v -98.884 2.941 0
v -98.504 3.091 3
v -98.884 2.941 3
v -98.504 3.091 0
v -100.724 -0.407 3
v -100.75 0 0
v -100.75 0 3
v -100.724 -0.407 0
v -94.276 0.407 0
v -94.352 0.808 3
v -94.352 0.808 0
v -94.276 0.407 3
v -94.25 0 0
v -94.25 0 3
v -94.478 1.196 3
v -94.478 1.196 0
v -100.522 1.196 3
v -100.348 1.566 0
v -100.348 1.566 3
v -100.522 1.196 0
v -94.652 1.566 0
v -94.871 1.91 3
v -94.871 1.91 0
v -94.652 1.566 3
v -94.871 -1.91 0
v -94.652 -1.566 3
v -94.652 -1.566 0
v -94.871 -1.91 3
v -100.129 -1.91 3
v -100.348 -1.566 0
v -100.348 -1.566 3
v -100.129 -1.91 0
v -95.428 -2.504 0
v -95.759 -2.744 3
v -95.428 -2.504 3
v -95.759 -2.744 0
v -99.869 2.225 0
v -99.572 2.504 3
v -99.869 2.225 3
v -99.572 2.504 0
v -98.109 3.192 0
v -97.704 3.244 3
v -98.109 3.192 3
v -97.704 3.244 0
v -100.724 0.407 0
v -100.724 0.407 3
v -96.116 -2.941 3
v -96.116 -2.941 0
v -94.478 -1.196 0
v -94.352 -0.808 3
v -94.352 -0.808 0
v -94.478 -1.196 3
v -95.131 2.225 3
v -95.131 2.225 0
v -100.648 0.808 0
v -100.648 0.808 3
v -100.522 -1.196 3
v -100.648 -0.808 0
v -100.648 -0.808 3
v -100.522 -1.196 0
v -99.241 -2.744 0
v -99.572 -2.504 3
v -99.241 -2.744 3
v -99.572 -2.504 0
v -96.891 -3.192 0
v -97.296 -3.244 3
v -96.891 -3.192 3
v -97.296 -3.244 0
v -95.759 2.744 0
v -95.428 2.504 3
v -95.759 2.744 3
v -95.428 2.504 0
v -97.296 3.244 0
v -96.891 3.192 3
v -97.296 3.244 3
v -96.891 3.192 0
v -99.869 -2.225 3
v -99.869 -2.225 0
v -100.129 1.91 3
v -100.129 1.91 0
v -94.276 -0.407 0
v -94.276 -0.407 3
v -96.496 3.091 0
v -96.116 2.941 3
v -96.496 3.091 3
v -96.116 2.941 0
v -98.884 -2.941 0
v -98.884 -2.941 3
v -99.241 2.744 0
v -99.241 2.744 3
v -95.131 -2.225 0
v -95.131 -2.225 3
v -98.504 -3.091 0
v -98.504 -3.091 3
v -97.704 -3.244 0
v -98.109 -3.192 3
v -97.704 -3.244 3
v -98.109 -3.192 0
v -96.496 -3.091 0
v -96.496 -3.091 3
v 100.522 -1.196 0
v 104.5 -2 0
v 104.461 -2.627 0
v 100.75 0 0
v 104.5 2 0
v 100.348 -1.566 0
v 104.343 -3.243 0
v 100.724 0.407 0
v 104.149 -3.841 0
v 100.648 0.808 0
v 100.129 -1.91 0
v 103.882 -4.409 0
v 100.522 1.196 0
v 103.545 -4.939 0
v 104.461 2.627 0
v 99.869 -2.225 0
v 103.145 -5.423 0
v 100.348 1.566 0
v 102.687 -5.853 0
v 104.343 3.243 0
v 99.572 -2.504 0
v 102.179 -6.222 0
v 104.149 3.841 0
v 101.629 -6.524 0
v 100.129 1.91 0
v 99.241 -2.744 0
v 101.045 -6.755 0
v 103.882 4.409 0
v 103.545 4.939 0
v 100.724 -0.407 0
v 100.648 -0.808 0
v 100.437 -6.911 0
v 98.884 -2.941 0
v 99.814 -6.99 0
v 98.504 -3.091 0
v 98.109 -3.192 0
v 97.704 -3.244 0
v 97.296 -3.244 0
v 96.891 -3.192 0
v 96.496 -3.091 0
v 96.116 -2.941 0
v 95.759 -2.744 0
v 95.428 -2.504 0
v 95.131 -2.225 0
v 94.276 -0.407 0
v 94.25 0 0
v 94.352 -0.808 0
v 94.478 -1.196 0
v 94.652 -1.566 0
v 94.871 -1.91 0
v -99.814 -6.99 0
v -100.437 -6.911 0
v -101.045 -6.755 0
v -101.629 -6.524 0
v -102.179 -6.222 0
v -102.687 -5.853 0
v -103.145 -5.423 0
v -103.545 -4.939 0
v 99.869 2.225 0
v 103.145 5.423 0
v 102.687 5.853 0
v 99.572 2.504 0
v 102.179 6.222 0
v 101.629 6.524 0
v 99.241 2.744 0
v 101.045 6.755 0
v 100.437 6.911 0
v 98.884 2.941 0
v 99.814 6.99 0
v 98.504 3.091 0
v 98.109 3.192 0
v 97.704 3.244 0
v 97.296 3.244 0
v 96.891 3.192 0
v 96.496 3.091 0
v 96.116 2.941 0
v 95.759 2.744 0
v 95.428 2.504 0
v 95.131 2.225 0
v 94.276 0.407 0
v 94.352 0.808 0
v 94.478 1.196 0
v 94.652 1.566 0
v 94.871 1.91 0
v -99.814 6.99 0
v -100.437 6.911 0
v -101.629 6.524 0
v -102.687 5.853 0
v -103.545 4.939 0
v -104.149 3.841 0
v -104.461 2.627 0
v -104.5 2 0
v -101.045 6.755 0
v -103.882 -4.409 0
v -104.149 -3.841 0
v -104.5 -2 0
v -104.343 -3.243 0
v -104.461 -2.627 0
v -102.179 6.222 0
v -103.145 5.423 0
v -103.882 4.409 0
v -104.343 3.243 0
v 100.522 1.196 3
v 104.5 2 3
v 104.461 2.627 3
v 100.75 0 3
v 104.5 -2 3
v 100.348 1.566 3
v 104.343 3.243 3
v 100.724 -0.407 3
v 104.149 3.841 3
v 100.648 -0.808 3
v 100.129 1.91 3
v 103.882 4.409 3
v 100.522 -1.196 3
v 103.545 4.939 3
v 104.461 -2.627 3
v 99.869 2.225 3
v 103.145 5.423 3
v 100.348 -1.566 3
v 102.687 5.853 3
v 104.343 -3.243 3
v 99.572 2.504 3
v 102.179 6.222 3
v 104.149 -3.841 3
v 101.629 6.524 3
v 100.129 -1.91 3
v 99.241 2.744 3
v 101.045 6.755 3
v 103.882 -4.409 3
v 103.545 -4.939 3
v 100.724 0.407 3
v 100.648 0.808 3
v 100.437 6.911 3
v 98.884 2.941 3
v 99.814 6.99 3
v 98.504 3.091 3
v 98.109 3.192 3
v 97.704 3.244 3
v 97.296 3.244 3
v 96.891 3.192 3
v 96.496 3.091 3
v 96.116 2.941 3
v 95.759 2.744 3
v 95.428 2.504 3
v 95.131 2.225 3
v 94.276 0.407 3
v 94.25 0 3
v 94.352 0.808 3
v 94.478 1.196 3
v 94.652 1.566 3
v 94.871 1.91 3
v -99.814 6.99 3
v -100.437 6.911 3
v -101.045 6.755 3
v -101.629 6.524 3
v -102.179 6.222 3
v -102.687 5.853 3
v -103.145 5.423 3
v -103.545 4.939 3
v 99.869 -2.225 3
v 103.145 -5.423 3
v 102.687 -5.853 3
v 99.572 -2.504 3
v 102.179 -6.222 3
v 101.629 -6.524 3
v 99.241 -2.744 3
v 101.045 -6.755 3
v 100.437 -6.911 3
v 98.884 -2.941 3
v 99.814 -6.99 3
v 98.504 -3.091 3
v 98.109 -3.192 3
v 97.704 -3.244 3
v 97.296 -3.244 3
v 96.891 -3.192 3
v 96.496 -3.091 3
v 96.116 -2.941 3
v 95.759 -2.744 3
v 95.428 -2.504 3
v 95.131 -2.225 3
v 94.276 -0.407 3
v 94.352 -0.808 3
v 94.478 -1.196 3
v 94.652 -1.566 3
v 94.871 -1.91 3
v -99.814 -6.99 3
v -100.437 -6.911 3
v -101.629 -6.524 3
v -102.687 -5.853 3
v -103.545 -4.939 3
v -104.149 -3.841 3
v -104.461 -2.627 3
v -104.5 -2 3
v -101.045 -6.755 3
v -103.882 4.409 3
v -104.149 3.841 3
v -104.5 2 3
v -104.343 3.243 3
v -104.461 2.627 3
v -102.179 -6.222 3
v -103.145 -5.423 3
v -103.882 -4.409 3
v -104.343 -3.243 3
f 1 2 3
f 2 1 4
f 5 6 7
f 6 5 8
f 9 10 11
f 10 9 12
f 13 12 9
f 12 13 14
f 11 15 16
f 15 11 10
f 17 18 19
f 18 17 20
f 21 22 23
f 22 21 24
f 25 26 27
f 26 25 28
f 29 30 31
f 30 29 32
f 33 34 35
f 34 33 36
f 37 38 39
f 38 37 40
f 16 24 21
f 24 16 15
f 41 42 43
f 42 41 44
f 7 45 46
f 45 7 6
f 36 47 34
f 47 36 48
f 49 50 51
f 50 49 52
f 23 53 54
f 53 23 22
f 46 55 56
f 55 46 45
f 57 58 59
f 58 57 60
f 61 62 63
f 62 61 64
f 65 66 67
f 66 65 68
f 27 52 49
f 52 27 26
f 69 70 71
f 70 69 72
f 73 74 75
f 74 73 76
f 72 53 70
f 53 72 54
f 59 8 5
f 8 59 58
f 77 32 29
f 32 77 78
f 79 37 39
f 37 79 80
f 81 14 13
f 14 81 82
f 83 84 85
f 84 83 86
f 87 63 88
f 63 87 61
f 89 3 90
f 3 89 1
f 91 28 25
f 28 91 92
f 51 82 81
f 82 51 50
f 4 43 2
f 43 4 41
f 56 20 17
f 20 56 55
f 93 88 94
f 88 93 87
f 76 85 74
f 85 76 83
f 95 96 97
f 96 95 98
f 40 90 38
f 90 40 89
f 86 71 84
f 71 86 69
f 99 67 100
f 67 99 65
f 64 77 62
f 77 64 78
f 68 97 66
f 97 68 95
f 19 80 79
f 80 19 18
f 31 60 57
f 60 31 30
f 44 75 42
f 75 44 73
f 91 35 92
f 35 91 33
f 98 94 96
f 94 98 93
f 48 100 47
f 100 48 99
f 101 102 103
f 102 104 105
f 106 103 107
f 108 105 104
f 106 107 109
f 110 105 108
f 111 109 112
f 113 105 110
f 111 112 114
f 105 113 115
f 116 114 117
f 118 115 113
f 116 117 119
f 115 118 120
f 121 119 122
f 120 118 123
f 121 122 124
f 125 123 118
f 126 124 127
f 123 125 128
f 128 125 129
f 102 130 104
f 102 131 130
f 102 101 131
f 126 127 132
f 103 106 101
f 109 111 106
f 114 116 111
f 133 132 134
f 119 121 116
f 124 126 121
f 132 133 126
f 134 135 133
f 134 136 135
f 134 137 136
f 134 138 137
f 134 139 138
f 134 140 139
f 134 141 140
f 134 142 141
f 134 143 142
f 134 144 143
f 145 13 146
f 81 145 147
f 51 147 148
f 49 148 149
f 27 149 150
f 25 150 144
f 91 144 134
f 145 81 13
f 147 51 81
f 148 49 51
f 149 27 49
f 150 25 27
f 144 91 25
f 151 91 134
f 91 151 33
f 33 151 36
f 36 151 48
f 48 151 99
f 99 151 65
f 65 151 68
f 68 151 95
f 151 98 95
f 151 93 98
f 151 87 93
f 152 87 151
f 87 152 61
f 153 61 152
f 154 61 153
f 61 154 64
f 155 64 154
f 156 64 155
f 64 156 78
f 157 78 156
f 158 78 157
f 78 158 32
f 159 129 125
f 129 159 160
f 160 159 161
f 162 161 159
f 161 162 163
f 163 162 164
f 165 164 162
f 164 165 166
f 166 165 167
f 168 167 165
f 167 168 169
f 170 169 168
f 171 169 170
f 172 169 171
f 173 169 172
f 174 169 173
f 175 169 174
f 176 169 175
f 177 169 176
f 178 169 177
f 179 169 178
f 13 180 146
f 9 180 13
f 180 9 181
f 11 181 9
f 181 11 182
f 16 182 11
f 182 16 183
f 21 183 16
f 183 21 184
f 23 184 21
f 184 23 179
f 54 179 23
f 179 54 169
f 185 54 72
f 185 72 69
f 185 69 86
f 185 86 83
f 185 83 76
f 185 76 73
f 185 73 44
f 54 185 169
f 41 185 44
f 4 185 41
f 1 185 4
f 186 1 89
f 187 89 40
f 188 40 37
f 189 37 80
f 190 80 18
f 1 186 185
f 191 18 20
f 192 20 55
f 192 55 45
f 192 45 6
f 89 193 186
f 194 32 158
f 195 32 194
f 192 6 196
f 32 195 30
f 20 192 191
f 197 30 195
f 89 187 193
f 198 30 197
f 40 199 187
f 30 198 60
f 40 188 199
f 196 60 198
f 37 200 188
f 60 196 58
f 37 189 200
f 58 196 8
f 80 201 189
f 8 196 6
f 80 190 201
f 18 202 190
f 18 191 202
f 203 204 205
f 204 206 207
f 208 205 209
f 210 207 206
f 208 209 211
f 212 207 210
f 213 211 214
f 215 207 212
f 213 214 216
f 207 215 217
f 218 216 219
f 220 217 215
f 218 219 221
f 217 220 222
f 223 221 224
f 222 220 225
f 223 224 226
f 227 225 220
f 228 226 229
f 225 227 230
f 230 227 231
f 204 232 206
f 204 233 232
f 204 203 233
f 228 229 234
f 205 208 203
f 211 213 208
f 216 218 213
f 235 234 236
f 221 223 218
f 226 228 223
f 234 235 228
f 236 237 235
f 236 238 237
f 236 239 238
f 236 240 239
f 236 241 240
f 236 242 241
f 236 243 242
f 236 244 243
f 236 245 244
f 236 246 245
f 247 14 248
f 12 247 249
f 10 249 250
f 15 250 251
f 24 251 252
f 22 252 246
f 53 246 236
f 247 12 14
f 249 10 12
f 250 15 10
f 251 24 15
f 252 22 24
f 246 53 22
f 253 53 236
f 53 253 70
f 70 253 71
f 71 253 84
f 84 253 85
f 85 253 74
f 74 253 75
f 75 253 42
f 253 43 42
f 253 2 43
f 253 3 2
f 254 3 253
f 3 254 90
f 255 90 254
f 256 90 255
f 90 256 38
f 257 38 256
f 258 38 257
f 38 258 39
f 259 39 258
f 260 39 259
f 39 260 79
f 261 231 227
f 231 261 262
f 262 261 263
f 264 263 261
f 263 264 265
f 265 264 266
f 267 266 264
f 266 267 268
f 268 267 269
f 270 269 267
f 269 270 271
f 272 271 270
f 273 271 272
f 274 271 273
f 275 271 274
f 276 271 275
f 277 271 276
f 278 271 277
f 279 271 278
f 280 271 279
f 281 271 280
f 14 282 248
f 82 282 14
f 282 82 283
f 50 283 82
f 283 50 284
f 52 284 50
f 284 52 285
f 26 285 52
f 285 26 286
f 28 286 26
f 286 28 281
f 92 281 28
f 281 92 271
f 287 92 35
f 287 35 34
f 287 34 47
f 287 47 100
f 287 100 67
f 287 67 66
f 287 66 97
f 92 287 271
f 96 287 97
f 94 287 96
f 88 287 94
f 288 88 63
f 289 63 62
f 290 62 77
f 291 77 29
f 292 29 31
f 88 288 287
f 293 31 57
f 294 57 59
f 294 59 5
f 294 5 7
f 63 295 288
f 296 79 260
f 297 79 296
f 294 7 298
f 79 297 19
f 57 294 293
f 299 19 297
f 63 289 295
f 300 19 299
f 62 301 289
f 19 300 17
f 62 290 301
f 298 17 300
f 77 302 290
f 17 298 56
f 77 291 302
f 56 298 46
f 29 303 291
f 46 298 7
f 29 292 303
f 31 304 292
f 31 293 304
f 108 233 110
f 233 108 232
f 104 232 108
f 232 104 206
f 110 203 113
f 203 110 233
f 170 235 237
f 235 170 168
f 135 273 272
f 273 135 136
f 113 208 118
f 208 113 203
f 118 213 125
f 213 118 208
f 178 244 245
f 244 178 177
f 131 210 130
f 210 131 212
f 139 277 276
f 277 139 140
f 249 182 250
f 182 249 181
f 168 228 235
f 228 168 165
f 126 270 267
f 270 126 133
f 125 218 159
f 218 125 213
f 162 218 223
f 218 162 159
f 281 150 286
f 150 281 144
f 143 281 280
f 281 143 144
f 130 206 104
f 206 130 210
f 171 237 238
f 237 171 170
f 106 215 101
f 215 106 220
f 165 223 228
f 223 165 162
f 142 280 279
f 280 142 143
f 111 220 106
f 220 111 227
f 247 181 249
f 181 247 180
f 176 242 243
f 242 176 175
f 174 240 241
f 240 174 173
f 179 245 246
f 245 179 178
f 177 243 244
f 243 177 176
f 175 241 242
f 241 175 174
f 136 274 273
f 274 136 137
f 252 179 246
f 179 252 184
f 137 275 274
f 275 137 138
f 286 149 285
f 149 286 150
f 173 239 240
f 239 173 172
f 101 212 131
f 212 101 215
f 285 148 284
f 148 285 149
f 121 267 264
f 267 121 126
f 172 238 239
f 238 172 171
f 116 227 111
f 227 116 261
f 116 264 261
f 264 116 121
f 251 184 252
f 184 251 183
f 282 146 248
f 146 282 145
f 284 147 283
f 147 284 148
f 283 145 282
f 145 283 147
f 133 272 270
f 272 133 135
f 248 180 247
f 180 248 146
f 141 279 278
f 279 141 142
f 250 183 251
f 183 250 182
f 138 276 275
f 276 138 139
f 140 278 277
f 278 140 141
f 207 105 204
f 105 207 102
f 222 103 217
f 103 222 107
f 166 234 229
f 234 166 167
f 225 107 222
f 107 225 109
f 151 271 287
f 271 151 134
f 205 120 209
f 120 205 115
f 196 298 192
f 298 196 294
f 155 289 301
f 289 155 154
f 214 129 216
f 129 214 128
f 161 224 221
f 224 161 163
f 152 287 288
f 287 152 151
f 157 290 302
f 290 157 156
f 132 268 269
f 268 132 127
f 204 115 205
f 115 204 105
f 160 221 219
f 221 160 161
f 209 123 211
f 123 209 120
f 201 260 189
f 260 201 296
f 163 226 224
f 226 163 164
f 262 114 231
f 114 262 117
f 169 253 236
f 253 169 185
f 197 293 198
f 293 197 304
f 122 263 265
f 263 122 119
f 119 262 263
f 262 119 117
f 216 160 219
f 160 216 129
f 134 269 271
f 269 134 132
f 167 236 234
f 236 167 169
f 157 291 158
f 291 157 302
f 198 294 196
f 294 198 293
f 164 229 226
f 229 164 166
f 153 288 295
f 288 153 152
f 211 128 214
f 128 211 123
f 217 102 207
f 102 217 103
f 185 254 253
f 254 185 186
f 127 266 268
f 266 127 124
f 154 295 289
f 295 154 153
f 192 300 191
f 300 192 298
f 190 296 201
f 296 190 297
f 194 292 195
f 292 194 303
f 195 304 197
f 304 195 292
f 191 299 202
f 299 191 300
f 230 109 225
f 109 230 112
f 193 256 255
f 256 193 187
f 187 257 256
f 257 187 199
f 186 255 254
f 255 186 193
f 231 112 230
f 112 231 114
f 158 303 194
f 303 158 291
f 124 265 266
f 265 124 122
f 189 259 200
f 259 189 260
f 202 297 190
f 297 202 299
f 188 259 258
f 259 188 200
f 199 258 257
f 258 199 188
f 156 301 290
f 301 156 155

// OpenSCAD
$fn = 50;


difference() {
	union() {
		hull() {
			translate(v = [-99.5000000000, 2.0000000000, 0]) {
				cylinder(h = 3, r = 5);
			}
			translate(v = [99.5000000000, 2.0000000000, 0]) {
				cylinder(h = 3, r = 5);
			}
			translate(v = [-99.5000000000, -2.0000000000, 0]) {
				cylinder(h = 3, r = 5);
			}
			translate(v = [99.5000000000, -2.0000000000, 0]) {
				cylinder(h = 3, r = 5);
			}
		}
	}
	union() {
		translate(v = [-97.5000000000, 0.0000000000, 0]) {
			cylinder(h = 3, r = 3.2500000000);
		}
		translate(v = [97.5000000000, 0.0000000000, 0]) {
			cylinder(h = 3, r = 3.2500000000);
		}
		translate(v = [-97.5000000000, 0.0000000000, 0]) {
			cylinder(h = 3, r = 1.8000000000);
		}
		translate(v = [97.5000000000, 0.0000000000, 0]) {
			cylinder(h = 3, r = 1.8000000000);
		}
		translate(v = [-97.5000000000, 0.0000000000, 0]) {
			cylinder(h = 3, r = 1.8000000000);
		}
		translate(v = [97.5000000000, 0.0000000000, 0]) {
			cylinder(h = 3, r = 1.8000000000);
		}
		translate(v = [-97.5000000000, 0.0000000000, 0]) {
			cylinder(h = 3, r = 1.8000000000);
		}
		translate(v = [97.5000000000, 0.0000000000, 0]) {
			cylinder(h = 3, r = 1.8000000000);
		}
	}
}
